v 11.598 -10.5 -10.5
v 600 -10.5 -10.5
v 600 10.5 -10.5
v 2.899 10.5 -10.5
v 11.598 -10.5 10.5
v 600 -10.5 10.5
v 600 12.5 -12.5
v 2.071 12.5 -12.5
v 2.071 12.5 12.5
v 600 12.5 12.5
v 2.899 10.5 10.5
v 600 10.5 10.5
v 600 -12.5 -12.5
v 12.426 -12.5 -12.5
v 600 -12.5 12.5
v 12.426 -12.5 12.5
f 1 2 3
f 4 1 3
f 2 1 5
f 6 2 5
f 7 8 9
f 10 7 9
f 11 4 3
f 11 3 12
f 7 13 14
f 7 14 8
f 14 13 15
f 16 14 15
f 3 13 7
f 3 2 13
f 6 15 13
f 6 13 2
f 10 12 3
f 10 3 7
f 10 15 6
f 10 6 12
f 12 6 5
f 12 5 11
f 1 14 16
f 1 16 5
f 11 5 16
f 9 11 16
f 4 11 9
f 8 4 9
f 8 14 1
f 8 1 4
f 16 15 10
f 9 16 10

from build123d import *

# Parameters (mm, degrees)
F0_W        = 25
F0_H        = 25
F0_W_2      = 21
F0_H_2      = 21
F1_DEPTH    = 600
F2_T1_DEPTH = 180.5602235744


# Not quite as in the source:
# - a fillet or chamfer that OpenCascade refuses, or shapes differently, is made with other operations: its cross-section is extruded or revolved along the edge and cut away or added


with BuildPart() as f1:
    # F0 (on Right) → F1 (new body)
    with BuildSketch(Plane.YZ):
        Rectangle(F0_W, F0_H)
        Rectangle(F0_W_2, F0_H_2, mode=Mode.SUBTRACT)
    extrude(amount=F1_DEPTH)

    # F2: chamfer of 30 x 12.4264068712 on 1 edges, made by hand

    # F2_s2 → F2_t1 (cut)
    with BuildSketch(Plane.XY.offset(-90.2801117872)):
        Polygon((12.4264068712, -12.5), (0, 17.5), (0, -12.5), align=None)
    extrude(amount=F2_T1_DEPTH, mode=Mode.SUBTRACT)


solid = f1.part
